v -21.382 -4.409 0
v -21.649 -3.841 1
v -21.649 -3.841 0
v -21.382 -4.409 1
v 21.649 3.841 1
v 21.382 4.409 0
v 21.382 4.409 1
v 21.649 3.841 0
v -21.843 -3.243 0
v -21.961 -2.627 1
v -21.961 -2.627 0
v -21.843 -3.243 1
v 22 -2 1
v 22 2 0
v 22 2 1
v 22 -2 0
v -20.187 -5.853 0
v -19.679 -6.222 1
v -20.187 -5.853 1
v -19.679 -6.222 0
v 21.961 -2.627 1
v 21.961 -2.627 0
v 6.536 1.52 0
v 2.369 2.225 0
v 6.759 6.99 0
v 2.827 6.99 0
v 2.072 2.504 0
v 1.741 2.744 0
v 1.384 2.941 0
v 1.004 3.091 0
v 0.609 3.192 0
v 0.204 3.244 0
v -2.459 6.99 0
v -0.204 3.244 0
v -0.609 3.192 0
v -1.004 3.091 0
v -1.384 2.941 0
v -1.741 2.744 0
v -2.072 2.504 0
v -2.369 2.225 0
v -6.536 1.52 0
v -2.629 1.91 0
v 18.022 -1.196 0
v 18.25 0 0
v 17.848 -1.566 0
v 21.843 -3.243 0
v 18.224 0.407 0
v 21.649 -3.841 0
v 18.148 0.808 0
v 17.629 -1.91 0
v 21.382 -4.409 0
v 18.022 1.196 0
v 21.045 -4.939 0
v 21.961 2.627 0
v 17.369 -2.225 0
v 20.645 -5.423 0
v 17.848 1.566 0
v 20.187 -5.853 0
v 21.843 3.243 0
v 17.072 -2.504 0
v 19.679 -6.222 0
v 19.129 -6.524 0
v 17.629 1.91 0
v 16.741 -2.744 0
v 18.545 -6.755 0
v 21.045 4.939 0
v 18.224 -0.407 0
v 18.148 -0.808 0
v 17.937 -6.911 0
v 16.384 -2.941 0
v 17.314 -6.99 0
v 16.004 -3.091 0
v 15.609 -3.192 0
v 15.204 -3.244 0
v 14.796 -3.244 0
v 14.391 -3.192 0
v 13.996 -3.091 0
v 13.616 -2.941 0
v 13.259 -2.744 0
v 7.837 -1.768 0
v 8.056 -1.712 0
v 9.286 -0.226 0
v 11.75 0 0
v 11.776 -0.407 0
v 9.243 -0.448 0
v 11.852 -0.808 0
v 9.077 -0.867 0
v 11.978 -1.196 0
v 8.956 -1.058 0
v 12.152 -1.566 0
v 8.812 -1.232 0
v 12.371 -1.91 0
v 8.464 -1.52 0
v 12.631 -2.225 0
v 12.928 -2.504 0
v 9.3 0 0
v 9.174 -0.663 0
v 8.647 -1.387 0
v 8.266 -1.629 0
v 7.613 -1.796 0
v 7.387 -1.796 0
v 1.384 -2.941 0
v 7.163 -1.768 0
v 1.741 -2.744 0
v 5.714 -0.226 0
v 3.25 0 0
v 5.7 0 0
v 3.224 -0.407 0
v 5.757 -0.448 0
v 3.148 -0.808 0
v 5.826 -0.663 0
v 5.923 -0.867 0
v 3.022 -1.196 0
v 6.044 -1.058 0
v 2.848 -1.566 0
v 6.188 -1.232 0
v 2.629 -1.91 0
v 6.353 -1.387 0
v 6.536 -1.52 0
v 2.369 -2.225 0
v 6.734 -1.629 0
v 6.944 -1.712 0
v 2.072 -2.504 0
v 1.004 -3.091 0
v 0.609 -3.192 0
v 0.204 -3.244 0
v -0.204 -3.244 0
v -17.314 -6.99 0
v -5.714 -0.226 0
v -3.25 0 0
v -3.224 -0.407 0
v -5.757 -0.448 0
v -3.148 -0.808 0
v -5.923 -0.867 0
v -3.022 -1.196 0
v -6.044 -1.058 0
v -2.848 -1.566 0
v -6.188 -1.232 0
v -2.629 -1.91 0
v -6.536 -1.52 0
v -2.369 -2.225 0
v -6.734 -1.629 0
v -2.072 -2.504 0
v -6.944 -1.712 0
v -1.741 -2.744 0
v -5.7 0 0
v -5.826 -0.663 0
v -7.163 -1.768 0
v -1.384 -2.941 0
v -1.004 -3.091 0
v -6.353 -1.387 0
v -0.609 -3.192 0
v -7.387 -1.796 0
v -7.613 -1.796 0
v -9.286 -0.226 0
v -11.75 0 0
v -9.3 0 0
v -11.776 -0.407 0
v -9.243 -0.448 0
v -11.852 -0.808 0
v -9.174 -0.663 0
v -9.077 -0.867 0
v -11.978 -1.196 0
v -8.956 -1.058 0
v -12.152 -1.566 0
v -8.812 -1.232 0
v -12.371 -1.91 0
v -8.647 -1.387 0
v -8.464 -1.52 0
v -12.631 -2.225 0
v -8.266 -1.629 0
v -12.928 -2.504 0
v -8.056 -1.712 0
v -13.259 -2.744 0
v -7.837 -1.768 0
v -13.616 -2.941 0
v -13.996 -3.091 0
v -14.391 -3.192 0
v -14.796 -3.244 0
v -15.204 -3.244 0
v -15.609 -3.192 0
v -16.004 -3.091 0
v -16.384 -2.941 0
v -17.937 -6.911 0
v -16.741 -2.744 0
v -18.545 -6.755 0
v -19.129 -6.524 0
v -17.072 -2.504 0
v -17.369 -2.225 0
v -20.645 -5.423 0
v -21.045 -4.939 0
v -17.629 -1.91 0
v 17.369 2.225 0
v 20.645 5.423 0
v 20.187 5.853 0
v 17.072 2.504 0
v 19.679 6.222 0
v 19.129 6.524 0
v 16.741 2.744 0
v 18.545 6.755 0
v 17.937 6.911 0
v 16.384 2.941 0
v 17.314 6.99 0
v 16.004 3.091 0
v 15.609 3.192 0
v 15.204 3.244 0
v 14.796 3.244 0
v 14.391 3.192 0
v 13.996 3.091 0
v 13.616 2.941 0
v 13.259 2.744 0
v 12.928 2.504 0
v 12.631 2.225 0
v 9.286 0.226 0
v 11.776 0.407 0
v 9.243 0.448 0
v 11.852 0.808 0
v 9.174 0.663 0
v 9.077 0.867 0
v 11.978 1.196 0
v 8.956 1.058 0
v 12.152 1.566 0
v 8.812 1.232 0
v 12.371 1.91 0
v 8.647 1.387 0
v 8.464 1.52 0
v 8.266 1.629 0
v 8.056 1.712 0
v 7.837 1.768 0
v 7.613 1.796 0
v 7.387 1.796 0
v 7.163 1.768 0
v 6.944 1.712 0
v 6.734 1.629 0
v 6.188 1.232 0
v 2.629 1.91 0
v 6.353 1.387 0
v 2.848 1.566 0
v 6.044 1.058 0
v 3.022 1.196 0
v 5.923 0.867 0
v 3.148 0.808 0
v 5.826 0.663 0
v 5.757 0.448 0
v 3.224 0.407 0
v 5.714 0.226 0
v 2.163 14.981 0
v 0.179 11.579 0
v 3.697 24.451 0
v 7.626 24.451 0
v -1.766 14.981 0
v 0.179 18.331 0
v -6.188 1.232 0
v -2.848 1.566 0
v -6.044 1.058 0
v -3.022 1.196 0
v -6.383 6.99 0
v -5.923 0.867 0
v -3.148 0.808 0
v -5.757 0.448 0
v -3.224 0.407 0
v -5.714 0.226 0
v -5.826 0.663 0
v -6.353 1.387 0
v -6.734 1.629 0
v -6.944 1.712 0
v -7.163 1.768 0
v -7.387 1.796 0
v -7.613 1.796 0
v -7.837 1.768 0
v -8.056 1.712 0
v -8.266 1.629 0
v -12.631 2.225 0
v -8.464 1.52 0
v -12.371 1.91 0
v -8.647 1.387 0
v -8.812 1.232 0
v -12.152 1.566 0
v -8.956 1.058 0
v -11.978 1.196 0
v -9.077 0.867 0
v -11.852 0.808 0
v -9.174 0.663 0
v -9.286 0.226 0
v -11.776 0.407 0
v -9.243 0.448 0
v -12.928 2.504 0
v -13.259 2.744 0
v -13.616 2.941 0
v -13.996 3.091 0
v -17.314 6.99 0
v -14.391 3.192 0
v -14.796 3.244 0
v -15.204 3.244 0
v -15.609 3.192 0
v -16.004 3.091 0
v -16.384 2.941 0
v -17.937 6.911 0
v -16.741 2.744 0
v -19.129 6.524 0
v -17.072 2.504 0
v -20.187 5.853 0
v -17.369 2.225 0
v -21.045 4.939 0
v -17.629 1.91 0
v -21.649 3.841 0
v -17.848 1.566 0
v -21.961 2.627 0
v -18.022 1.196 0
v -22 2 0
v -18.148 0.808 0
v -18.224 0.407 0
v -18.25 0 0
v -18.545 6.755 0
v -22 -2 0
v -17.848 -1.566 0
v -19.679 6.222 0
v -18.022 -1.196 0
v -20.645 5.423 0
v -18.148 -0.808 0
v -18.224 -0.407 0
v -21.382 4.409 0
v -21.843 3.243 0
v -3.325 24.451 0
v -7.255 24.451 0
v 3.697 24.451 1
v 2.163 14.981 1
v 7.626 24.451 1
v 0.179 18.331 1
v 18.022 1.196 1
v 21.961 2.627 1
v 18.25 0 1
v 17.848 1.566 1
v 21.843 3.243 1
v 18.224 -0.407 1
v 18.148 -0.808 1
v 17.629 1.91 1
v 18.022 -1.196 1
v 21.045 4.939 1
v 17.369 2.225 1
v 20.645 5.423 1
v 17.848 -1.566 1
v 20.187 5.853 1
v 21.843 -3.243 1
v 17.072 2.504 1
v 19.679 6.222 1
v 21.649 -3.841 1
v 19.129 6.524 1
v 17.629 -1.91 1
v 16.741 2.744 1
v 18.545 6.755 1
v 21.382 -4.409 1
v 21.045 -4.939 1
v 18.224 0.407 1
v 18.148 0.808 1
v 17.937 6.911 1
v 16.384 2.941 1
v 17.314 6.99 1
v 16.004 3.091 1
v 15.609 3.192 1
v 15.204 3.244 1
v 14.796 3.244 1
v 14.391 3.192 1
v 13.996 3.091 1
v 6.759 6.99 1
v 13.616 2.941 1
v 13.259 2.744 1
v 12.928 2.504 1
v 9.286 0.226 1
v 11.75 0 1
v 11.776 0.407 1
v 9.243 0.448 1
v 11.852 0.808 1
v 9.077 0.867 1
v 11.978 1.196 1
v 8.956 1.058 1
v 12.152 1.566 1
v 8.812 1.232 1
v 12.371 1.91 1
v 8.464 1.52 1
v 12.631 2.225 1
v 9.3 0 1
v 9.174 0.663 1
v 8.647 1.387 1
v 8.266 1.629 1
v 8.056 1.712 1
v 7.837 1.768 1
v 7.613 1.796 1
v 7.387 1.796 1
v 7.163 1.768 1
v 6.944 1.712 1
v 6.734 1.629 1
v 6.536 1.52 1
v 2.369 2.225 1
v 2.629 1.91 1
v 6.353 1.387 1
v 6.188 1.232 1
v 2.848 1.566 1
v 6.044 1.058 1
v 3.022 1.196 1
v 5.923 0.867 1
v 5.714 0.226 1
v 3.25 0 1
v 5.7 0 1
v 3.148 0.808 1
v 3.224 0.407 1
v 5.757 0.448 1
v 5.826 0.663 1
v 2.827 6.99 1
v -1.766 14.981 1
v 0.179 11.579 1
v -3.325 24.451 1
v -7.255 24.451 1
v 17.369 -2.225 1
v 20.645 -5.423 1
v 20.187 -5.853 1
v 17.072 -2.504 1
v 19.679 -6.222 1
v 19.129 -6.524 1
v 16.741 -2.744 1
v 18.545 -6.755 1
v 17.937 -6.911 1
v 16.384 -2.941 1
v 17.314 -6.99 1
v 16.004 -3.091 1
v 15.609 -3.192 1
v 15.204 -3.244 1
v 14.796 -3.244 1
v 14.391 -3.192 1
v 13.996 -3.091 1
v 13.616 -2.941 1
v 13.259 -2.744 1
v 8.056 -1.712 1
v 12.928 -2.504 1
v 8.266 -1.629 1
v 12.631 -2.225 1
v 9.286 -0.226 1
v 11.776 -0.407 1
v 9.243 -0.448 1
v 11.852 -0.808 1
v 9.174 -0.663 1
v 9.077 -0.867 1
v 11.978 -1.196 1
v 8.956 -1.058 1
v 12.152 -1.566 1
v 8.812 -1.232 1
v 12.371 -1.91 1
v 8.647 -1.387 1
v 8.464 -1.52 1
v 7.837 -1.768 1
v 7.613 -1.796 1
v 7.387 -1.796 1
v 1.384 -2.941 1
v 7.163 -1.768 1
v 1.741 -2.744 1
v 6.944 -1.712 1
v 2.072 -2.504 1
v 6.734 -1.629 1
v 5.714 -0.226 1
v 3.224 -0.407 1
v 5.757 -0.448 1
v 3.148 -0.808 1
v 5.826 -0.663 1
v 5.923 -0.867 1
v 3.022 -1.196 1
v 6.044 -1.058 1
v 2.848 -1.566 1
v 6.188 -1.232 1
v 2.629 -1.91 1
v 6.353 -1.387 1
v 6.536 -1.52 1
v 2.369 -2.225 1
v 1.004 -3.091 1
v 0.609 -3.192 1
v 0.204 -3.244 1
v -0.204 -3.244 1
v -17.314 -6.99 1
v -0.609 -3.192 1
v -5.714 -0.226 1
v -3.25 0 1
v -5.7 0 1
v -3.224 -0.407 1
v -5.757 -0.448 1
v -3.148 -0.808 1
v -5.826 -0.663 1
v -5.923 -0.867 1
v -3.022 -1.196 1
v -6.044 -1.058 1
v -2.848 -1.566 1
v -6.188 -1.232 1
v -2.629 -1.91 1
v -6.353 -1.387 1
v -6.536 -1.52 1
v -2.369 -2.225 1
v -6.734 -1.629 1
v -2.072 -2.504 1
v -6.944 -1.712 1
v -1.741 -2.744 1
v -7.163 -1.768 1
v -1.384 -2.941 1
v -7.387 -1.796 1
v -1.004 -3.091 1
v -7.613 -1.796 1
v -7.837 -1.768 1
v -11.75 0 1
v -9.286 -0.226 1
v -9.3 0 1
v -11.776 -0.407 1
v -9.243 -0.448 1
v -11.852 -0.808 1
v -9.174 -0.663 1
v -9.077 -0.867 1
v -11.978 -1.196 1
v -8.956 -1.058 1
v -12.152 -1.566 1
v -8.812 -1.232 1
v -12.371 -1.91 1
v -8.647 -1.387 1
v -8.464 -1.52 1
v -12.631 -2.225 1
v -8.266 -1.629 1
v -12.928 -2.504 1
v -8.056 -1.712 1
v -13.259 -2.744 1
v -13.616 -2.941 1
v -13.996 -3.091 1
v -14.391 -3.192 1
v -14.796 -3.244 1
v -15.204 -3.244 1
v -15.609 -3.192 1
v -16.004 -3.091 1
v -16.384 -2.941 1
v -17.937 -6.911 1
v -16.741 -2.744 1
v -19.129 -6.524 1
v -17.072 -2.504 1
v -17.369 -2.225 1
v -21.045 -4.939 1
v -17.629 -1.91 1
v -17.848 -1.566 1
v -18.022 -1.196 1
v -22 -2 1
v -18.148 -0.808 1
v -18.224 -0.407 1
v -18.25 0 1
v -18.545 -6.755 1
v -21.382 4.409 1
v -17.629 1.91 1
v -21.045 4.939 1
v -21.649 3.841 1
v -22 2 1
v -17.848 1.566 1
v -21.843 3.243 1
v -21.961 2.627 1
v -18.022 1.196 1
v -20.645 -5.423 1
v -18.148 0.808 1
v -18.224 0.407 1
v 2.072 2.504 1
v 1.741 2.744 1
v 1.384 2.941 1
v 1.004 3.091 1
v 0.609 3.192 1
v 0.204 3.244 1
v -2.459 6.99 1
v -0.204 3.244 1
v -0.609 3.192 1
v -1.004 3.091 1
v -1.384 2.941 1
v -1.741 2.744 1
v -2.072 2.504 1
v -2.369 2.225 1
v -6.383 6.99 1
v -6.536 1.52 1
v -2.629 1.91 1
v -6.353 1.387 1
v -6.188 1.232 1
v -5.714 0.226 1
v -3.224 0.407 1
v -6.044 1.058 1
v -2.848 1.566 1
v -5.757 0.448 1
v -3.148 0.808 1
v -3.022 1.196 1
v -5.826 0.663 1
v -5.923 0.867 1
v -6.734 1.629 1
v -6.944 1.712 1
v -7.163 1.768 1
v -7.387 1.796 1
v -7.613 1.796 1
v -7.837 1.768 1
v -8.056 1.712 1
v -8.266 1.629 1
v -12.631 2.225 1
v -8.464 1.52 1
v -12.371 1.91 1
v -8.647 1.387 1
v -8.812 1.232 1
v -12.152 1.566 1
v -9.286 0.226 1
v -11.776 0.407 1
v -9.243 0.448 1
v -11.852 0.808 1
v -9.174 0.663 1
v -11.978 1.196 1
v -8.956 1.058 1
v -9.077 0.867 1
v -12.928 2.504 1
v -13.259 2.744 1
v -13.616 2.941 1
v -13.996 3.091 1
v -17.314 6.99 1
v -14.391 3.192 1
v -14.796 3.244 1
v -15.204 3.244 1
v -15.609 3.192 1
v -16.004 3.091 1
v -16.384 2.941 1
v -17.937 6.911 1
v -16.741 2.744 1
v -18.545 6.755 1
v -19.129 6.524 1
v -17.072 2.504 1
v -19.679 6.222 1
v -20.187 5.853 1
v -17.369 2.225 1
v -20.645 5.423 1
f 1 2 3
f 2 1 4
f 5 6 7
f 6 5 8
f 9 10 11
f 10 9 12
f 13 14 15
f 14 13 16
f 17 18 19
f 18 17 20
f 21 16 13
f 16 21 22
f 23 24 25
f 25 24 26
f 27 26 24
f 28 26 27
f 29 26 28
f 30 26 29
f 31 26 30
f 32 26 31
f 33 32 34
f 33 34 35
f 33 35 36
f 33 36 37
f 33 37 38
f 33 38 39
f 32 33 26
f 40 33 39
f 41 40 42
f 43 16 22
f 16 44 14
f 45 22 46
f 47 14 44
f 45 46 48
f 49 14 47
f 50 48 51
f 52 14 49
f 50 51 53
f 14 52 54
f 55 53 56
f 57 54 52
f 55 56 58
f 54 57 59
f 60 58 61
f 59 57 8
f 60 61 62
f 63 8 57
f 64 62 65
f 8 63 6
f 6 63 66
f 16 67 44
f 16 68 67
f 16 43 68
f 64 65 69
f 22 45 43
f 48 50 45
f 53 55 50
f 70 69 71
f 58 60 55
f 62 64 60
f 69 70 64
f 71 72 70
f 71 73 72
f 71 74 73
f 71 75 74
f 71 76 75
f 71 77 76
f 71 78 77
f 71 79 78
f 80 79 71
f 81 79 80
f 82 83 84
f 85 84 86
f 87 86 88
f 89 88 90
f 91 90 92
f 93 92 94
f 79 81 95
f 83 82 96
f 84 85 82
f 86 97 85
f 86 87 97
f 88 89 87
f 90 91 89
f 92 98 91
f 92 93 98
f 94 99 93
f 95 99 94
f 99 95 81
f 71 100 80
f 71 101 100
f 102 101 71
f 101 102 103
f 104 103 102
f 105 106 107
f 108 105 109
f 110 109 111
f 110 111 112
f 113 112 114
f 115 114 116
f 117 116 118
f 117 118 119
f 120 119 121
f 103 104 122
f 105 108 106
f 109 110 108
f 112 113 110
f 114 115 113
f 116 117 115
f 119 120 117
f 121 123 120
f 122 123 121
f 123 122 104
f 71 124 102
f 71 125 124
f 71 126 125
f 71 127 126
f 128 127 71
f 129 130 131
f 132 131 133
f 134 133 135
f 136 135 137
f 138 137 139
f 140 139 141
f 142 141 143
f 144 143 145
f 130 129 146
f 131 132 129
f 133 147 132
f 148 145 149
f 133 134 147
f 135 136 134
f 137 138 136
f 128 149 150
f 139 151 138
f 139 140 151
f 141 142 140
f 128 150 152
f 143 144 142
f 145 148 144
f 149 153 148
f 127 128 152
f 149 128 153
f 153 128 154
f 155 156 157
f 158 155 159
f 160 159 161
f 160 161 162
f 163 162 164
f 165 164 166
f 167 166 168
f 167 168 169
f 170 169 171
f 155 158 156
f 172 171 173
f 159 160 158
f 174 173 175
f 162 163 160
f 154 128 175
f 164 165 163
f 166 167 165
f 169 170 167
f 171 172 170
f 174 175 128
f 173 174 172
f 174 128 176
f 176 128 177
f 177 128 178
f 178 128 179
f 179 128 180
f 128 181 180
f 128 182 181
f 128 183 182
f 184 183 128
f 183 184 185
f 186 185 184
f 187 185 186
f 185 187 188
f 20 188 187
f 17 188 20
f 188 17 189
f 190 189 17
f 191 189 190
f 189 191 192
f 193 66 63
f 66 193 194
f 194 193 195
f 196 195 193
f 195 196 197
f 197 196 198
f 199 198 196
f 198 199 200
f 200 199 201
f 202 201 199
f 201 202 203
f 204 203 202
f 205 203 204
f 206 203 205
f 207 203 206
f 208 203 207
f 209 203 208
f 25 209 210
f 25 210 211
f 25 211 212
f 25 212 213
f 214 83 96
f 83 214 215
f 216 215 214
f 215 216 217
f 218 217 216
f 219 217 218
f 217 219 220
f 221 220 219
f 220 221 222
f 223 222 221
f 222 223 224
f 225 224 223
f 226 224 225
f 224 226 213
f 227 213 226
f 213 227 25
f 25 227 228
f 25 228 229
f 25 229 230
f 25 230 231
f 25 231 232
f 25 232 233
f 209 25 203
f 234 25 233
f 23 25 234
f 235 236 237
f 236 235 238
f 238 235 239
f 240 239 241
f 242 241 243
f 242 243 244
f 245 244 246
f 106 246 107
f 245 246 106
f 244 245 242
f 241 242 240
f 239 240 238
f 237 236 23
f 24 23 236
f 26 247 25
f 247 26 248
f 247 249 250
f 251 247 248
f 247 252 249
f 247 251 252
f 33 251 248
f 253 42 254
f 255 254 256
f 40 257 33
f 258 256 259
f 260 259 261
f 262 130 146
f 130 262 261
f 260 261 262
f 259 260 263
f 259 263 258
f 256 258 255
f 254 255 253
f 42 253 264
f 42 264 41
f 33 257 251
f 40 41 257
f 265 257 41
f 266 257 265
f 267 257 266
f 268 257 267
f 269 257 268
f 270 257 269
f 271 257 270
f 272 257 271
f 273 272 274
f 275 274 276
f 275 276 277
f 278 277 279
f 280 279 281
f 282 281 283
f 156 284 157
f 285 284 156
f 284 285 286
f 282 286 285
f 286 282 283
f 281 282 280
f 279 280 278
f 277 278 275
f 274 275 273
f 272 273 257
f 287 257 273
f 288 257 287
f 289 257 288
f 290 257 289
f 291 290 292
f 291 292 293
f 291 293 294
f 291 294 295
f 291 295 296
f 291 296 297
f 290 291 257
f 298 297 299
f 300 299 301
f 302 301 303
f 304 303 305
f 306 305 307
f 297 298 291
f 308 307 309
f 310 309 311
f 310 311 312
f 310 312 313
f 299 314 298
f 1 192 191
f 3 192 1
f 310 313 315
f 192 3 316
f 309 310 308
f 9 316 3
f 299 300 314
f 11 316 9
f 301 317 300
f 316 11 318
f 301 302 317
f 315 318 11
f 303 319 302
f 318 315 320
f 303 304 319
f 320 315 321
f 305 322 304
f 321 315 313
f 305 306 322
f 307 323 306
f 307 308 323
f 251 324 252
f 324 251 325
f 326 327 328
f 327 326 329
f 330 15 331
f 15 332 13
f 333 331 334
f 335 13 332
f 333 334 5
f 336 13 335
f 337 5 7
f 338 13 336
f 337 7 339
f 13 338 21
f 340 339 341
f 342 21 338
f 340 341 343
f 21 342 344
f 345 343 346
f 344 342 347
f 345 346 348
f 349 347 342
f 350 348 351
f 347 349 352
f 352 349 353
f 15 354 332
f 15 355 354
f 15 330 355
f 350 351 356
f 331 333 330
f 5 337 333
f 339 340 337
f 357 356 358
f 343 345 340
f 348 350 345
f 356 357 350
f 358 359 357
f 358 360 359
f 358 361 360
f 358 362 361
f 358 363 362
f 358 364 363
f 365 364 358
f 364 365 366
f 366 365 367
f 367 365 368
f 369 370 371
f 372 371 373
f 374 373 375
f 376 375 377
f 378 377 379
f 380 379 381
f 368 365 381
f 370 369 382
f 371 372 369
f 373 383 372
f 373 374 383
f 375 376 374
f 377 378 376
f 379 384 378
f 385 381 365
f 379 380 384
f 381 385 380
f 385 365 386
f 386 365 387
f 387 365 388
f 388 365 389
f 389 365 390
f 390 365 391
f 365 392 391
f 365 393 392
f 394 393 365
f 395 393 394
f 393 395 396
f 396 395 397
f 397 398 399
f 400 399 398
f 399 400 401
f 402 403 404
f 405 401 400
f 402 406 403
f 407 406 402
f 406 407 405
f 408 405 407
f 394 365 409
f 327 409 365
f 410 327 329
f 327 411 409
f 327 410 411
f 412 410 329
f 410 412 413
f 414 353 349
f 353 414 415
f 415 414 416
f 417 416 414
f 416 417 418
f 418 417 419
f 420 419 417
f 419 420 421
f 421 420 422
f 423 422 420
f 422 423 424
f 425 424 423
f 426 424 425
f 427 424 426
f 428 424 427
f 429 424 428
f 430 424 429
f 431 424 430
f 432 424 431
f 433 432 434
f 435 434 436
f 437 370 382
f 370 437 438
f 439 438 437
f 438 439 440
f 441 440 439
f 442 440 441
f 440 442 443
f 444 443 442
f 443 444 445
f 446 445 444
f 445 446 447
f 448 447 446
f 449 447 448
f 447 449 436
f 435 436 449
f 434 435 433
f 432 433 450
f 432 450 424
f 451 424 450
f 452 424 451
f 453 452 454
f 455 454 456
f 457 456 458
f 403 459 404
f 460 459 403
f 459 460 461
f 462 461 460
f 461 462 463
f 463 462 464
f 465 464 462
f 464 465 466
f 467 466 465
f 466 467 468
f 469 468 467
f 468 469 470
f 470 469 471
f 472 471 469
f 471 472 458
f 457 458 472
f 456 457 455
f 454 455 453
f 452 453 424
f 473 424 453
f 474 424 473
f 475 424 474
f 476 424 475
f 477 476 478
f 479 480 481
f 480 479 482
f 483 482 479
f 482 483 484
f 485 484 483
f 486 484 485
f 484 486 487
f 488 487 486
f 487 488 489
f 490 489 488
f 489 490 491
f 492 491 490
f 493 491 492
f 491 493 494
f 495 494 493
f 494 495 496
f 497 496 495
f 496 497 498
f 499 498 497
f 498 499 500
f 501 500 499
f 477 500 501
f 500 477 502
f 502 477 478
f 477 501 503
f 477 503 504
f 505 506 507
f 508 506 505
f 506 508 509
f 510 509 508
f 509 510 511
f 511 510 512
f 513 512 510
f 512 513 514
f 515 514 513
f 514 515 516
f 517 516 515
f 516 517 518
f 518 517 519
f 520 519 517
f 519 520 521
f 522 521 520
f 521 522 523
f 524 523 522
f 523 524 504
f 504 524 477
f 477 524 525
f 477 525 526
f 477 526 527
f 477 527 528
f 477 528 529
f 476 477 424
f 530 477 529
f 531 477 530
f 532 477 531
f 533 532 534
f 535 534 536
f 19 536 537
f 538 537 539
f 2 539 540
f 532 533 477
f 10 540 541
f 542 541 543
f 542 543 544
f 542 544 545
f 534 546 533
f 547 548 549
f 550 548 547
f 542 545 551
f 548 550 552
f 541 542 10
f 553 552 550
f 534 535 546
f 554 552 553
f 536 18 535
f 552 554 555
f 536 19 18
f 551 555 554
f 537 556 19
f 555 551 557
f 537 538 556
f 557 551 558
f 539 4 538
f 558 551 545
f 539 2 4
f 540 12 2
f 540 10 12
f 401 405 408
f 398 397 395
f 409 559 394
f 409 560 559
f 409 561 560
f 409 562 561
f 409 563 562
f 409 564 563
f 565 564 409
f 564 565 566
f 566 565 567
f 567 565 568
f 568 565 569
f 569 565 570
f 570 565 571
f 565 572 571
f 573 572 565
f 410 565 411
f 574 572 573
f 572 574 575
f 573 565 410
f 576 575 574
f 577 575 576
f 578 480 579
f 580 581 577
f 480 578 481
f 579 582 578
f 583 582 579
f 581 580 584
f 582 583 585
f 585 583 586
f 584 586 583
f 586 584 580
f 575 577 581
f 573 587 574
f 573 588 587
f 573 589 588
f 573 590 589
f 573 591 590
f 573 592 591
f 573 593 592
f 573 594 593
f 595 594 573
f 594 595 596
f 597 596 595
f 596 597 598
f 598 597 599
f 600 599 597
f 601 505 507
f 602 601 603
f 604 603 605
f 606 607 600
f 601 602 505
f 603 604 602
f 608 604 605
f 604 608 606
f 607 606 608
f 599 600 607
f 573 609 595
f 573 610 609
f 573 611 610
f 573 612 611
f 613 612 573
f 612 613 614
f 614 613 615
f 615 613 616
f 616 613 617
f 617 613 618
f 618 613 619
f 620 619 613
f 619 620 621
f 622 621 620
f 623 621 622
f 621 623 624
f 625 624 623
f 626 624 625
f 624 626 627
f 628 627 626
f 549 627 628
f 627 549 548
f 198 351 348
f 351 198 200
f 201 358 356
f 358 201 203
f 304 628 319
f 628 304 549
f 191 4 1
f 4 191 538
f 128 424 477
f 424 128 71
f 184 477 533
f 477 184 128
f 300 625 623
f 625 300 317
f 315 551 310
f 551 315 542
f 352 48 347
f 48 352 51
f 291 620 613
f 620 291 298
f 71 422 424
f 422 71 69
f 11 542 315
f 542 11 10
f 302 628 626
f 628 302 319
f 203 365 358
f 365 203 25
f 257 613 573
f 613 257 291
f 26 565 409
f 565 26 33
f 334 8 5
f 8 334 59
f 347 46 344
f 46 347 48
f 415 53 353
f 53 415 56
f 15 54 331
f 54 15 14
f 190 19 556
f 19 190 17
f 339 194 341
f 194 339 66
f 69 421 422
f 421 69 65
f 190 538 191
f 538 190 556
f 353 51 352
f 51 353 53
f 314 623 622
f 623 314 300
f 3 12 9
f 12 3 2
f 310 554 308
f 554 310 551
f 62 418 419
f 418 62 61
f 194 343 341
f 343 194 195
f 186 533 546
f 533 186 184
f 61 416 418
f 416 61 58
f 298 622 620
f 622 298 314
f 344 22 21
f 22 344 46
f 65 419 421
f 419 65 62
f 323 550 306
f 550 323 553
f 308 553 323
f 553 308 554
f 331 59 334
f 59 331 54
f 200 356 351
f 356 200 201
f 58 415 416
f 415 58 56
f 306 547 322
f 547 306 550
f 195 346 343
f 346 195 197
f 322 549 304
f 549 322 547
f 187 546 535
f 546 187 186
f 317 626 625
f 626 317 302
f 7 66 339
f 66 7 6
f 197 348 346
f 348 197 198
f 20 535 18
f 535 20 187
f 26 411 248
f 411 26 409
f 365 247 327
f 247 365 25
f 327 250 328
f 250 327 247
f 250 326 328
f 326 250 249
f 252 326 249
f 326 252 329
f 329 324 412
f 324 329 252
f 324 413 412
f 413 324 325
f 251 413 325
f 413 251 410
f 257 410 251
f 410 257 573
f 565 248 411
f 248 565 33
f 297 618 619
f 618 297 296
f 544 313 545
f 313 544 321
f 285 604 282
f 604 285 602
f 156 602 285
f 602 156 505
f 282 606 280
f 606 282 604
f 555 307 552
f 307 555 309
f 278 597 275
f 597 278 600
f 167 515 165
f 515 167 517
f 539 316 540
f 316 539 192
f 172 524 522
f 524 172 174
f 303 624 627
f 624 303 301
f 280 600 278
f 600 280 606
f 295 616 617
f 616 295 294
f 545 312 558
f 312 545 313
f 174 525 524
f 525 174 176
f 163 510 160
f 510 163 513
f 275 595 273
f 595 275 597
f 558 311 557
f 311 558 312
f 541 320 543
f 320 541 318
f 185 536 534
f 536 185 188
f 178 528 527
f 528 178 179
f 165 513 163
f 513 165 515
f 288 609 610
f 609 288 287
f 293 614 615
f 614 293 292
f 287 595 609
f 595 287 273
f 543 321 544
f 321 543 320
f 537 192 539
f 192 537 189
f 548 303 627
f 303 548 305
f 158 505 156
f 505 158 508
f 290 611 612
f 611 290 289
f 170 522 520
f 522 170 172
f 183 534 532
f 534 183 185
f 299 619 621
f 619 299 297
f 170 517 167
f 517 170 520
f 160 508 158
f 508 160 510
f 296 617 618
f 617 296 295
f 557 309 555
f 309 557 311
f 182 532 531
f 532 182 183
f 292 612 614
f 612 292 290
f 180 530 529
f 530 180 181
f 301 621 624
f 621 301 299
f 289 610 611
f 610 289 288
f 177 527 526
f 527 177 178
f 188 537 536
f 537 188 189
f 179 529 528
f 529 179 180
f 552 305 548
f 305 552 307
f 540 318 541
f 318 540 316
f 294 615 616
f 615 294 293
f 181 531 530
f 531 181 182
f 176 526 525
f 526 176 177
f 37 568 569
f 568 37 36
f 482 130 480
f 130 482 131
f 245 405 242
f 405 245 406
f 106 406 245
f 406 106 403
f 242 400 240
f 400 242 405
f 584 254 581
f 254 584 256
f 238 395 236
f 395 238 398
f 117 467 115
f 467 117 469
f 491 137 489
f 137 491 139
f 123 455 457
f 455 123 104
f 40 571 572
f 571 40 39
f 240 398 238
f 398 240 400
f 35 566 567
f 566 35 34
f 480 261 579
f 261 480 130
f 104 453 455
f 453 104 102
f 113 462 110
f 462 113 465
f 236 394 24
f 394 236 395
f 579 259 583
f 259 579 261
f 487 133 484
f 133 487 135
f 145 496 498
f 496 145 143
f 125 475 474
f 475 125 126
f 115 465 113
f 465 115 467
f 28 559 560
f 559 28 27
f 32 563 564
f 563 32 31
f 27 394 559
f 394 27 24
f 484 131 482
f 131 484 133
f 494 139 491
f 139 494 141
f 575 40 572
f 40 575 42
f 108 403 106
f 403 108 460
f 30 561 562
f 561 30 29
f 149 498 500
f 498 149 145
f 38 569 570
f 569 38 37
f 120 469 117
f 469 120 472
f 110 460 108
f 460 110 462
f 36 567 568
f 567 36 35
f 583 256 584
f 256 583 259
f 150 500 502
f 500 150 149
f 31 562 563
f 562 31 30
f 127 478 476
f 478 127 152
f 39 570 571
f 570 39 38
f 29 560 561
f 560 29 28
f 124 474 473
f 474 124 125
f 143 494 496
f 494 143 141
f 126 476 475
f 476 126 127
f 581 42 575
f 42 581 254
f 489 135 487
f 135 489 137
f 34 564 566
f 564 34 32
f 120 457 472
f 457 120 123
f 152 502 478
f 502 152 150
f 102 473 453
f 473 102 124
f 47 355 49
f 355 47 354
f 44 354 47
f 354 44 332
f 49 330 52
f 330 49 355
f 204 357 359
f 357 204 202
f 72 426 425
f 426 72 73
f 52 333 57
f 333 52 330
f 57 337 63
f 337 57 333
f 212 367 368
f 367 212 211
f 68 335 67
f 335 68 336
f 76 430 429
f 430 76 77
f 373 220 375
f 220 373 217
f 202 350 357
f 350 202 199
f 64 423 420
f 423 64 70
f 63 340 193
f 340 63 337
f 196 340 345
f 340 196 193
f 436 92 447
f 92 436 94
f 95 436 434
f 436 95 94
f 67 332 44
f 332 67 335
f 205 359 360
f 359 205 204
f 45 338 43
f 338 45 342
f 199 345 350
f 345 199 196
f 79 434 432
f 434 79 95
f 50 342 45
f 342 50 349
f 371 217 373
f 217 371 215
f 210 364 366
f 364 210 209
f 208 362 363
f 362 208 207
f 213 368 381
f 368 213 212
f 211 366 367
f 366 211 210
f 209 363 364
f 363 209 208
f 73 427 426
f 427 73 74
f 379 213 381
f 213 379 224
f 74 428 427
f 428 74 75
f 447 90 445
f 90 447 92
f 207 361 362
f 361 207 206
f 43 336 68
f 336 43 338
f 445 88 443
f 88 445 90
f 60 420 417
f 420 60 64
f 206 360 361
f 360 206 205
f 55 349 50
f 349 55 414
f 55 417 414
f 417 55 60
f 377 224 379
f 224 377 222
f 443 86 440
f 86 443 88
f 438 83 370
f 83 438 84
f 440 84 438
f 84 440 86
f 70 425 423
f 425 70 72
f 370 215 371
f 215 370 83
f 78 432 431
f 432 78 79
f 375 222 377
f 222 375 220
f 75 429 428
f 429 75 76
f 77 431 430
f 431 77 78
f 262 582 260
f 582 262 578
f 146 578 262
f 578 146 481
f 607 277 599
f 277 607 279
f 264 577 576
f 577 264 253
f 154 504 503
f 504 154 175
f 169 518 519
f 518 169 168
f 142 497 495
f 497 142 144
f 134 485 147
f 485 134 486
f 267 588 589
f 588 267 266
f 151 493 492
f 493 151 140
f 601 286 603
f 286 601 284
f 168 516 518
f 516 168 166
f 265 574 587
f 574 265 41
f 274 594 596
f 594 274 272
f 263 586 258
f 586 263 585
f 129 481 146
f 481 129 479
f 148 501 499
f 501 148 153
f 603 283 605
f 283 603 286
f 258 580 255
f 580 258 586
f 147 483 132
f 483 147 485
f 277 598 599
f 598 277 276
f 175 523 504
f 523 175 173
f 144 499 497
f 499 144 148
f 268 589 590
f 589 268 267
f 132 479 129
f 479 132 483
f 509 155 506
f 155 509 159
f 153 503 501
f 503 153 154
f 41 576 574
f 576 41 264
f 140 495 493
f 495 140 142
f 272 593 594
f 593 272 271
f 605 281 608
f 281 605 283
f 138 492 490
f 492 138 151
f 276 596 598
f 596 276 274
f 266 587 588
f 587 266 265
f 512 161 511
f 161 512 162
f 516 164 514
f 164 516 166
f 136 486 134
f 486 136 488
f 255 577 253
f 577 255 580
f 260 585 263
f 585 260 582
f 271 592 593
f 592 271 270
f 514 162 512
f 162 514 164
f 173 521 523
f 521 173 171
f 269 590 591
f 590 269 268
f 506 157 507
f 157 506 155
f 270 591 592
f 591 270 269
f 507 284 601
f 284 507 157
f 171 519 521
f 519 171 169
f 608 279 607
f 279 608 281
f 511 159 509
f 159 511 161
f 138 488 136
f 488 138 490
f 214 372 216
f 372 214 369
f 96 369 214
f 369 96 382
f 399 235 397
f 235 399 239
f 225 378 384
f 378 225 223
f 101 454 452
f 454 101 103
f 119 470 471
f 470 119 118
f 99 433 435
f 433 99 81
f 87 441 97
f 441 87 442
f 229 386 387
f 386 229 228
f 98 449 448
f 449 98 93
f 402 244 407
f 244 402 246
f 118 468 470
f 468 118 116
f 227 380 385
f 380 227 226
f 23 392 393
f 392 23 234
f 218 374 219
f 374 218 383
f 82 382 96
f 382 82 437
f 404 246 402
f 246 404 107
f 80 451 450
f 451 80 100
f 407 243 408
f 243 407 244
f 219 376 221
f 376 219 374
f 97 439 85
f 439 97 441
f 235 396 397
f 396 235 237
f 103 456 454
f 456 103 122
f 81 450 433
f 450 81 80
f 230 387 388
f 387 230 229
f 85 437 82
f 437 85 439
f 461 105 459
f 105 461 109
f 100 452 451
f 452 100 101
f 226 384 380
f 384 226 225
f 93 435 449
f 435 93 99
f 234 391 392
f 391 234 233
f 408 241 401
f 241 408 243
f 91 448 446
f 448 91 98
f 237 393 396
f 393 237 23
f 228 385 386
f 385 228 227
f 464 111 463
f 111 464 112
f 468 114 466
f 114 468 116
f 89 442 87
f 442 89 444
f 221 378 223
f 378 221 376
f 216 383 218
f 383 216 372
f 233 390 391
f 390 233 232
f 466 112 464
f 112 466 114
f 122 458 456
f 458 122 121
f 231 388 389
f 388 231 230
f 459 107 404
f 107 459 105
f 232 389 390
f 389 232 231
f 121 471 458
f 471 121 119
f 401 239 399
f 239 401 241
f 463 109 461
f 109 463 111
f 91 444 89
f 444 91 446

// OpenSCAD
$fn = 50;


difference() {
	union() {
		hull() {
			translate(v = [-17.0000000000, 2.0000000000, 0]) {
				cylinder(h = 1, r = 5);
			}
			translate(v = [17.0000000000, 2.0000000000, 0]) {
				cylinder(h = 1, r = 5);
			}
			translate(v = [-17.0000000000, -2.0000000000, 0]) {
				cylinder(h = 1, r = 5);
			}
			translate(v = [17.0000000000, -2.0000000000, 0]) {
				cylinder(h = 1, r = 5);
			}
		}
		translate(v = [0, 24, 0]) {
			linear_extrude(height = 1) {
				text(font = "DejaVu Sans Mono:style=Bold", halign = "center", size = 19.0000000000, text = "X", valign = "top");
			}
		}
	}
	union() {
		translate(v = [-15.0000000000, 0.0000000000, 0]) {
			translate(v = [0, 0, -100]) {
				cylinder(h = 200, r = 3.2500000000);
			}
		}
		translate(v = [0, 0, -100]) {
			cylinder(h = 200, r = 3.2500000000);
		}
		translate(v = [15.0000000000, 0.0000000000, 0]) {
			translate(v = [0, 0, -100]) {
				cylinder(h = 200, r = 3.2500000000);
			}
		}
		translate(v = [-15.0000000000, 0.0000000000, 0]) {
			translate(v = [0, 0, -100]) {
				cylinder(h = 200, r = 1.8000000000);
			}
		}
		translate(v = [-7.5000000000, 0.0000000000, 0]) {
			translate(v = [0, 0, -100]) {
				cylinder(h = 200, r = 1.8000000000);
			}
		}
		translate(v = [0, 0, -100]) {
			cylinder(h = 200, r = 1.8000000000);
		}
		translate(v = [7.5000000000, 0.0000000000, 0]) {
			translate(v = [0, 0, -100]) {
				cylinder(h = 200, r = 1.8000000000);
			}
		}
		translate(v = [15.0000000000, 0.0000000000, 0]) {
			translate(v = [0, 0, -100]) {
				cylinder(h = 200, r = 1.8000000000);
			}
		}
	}
}
